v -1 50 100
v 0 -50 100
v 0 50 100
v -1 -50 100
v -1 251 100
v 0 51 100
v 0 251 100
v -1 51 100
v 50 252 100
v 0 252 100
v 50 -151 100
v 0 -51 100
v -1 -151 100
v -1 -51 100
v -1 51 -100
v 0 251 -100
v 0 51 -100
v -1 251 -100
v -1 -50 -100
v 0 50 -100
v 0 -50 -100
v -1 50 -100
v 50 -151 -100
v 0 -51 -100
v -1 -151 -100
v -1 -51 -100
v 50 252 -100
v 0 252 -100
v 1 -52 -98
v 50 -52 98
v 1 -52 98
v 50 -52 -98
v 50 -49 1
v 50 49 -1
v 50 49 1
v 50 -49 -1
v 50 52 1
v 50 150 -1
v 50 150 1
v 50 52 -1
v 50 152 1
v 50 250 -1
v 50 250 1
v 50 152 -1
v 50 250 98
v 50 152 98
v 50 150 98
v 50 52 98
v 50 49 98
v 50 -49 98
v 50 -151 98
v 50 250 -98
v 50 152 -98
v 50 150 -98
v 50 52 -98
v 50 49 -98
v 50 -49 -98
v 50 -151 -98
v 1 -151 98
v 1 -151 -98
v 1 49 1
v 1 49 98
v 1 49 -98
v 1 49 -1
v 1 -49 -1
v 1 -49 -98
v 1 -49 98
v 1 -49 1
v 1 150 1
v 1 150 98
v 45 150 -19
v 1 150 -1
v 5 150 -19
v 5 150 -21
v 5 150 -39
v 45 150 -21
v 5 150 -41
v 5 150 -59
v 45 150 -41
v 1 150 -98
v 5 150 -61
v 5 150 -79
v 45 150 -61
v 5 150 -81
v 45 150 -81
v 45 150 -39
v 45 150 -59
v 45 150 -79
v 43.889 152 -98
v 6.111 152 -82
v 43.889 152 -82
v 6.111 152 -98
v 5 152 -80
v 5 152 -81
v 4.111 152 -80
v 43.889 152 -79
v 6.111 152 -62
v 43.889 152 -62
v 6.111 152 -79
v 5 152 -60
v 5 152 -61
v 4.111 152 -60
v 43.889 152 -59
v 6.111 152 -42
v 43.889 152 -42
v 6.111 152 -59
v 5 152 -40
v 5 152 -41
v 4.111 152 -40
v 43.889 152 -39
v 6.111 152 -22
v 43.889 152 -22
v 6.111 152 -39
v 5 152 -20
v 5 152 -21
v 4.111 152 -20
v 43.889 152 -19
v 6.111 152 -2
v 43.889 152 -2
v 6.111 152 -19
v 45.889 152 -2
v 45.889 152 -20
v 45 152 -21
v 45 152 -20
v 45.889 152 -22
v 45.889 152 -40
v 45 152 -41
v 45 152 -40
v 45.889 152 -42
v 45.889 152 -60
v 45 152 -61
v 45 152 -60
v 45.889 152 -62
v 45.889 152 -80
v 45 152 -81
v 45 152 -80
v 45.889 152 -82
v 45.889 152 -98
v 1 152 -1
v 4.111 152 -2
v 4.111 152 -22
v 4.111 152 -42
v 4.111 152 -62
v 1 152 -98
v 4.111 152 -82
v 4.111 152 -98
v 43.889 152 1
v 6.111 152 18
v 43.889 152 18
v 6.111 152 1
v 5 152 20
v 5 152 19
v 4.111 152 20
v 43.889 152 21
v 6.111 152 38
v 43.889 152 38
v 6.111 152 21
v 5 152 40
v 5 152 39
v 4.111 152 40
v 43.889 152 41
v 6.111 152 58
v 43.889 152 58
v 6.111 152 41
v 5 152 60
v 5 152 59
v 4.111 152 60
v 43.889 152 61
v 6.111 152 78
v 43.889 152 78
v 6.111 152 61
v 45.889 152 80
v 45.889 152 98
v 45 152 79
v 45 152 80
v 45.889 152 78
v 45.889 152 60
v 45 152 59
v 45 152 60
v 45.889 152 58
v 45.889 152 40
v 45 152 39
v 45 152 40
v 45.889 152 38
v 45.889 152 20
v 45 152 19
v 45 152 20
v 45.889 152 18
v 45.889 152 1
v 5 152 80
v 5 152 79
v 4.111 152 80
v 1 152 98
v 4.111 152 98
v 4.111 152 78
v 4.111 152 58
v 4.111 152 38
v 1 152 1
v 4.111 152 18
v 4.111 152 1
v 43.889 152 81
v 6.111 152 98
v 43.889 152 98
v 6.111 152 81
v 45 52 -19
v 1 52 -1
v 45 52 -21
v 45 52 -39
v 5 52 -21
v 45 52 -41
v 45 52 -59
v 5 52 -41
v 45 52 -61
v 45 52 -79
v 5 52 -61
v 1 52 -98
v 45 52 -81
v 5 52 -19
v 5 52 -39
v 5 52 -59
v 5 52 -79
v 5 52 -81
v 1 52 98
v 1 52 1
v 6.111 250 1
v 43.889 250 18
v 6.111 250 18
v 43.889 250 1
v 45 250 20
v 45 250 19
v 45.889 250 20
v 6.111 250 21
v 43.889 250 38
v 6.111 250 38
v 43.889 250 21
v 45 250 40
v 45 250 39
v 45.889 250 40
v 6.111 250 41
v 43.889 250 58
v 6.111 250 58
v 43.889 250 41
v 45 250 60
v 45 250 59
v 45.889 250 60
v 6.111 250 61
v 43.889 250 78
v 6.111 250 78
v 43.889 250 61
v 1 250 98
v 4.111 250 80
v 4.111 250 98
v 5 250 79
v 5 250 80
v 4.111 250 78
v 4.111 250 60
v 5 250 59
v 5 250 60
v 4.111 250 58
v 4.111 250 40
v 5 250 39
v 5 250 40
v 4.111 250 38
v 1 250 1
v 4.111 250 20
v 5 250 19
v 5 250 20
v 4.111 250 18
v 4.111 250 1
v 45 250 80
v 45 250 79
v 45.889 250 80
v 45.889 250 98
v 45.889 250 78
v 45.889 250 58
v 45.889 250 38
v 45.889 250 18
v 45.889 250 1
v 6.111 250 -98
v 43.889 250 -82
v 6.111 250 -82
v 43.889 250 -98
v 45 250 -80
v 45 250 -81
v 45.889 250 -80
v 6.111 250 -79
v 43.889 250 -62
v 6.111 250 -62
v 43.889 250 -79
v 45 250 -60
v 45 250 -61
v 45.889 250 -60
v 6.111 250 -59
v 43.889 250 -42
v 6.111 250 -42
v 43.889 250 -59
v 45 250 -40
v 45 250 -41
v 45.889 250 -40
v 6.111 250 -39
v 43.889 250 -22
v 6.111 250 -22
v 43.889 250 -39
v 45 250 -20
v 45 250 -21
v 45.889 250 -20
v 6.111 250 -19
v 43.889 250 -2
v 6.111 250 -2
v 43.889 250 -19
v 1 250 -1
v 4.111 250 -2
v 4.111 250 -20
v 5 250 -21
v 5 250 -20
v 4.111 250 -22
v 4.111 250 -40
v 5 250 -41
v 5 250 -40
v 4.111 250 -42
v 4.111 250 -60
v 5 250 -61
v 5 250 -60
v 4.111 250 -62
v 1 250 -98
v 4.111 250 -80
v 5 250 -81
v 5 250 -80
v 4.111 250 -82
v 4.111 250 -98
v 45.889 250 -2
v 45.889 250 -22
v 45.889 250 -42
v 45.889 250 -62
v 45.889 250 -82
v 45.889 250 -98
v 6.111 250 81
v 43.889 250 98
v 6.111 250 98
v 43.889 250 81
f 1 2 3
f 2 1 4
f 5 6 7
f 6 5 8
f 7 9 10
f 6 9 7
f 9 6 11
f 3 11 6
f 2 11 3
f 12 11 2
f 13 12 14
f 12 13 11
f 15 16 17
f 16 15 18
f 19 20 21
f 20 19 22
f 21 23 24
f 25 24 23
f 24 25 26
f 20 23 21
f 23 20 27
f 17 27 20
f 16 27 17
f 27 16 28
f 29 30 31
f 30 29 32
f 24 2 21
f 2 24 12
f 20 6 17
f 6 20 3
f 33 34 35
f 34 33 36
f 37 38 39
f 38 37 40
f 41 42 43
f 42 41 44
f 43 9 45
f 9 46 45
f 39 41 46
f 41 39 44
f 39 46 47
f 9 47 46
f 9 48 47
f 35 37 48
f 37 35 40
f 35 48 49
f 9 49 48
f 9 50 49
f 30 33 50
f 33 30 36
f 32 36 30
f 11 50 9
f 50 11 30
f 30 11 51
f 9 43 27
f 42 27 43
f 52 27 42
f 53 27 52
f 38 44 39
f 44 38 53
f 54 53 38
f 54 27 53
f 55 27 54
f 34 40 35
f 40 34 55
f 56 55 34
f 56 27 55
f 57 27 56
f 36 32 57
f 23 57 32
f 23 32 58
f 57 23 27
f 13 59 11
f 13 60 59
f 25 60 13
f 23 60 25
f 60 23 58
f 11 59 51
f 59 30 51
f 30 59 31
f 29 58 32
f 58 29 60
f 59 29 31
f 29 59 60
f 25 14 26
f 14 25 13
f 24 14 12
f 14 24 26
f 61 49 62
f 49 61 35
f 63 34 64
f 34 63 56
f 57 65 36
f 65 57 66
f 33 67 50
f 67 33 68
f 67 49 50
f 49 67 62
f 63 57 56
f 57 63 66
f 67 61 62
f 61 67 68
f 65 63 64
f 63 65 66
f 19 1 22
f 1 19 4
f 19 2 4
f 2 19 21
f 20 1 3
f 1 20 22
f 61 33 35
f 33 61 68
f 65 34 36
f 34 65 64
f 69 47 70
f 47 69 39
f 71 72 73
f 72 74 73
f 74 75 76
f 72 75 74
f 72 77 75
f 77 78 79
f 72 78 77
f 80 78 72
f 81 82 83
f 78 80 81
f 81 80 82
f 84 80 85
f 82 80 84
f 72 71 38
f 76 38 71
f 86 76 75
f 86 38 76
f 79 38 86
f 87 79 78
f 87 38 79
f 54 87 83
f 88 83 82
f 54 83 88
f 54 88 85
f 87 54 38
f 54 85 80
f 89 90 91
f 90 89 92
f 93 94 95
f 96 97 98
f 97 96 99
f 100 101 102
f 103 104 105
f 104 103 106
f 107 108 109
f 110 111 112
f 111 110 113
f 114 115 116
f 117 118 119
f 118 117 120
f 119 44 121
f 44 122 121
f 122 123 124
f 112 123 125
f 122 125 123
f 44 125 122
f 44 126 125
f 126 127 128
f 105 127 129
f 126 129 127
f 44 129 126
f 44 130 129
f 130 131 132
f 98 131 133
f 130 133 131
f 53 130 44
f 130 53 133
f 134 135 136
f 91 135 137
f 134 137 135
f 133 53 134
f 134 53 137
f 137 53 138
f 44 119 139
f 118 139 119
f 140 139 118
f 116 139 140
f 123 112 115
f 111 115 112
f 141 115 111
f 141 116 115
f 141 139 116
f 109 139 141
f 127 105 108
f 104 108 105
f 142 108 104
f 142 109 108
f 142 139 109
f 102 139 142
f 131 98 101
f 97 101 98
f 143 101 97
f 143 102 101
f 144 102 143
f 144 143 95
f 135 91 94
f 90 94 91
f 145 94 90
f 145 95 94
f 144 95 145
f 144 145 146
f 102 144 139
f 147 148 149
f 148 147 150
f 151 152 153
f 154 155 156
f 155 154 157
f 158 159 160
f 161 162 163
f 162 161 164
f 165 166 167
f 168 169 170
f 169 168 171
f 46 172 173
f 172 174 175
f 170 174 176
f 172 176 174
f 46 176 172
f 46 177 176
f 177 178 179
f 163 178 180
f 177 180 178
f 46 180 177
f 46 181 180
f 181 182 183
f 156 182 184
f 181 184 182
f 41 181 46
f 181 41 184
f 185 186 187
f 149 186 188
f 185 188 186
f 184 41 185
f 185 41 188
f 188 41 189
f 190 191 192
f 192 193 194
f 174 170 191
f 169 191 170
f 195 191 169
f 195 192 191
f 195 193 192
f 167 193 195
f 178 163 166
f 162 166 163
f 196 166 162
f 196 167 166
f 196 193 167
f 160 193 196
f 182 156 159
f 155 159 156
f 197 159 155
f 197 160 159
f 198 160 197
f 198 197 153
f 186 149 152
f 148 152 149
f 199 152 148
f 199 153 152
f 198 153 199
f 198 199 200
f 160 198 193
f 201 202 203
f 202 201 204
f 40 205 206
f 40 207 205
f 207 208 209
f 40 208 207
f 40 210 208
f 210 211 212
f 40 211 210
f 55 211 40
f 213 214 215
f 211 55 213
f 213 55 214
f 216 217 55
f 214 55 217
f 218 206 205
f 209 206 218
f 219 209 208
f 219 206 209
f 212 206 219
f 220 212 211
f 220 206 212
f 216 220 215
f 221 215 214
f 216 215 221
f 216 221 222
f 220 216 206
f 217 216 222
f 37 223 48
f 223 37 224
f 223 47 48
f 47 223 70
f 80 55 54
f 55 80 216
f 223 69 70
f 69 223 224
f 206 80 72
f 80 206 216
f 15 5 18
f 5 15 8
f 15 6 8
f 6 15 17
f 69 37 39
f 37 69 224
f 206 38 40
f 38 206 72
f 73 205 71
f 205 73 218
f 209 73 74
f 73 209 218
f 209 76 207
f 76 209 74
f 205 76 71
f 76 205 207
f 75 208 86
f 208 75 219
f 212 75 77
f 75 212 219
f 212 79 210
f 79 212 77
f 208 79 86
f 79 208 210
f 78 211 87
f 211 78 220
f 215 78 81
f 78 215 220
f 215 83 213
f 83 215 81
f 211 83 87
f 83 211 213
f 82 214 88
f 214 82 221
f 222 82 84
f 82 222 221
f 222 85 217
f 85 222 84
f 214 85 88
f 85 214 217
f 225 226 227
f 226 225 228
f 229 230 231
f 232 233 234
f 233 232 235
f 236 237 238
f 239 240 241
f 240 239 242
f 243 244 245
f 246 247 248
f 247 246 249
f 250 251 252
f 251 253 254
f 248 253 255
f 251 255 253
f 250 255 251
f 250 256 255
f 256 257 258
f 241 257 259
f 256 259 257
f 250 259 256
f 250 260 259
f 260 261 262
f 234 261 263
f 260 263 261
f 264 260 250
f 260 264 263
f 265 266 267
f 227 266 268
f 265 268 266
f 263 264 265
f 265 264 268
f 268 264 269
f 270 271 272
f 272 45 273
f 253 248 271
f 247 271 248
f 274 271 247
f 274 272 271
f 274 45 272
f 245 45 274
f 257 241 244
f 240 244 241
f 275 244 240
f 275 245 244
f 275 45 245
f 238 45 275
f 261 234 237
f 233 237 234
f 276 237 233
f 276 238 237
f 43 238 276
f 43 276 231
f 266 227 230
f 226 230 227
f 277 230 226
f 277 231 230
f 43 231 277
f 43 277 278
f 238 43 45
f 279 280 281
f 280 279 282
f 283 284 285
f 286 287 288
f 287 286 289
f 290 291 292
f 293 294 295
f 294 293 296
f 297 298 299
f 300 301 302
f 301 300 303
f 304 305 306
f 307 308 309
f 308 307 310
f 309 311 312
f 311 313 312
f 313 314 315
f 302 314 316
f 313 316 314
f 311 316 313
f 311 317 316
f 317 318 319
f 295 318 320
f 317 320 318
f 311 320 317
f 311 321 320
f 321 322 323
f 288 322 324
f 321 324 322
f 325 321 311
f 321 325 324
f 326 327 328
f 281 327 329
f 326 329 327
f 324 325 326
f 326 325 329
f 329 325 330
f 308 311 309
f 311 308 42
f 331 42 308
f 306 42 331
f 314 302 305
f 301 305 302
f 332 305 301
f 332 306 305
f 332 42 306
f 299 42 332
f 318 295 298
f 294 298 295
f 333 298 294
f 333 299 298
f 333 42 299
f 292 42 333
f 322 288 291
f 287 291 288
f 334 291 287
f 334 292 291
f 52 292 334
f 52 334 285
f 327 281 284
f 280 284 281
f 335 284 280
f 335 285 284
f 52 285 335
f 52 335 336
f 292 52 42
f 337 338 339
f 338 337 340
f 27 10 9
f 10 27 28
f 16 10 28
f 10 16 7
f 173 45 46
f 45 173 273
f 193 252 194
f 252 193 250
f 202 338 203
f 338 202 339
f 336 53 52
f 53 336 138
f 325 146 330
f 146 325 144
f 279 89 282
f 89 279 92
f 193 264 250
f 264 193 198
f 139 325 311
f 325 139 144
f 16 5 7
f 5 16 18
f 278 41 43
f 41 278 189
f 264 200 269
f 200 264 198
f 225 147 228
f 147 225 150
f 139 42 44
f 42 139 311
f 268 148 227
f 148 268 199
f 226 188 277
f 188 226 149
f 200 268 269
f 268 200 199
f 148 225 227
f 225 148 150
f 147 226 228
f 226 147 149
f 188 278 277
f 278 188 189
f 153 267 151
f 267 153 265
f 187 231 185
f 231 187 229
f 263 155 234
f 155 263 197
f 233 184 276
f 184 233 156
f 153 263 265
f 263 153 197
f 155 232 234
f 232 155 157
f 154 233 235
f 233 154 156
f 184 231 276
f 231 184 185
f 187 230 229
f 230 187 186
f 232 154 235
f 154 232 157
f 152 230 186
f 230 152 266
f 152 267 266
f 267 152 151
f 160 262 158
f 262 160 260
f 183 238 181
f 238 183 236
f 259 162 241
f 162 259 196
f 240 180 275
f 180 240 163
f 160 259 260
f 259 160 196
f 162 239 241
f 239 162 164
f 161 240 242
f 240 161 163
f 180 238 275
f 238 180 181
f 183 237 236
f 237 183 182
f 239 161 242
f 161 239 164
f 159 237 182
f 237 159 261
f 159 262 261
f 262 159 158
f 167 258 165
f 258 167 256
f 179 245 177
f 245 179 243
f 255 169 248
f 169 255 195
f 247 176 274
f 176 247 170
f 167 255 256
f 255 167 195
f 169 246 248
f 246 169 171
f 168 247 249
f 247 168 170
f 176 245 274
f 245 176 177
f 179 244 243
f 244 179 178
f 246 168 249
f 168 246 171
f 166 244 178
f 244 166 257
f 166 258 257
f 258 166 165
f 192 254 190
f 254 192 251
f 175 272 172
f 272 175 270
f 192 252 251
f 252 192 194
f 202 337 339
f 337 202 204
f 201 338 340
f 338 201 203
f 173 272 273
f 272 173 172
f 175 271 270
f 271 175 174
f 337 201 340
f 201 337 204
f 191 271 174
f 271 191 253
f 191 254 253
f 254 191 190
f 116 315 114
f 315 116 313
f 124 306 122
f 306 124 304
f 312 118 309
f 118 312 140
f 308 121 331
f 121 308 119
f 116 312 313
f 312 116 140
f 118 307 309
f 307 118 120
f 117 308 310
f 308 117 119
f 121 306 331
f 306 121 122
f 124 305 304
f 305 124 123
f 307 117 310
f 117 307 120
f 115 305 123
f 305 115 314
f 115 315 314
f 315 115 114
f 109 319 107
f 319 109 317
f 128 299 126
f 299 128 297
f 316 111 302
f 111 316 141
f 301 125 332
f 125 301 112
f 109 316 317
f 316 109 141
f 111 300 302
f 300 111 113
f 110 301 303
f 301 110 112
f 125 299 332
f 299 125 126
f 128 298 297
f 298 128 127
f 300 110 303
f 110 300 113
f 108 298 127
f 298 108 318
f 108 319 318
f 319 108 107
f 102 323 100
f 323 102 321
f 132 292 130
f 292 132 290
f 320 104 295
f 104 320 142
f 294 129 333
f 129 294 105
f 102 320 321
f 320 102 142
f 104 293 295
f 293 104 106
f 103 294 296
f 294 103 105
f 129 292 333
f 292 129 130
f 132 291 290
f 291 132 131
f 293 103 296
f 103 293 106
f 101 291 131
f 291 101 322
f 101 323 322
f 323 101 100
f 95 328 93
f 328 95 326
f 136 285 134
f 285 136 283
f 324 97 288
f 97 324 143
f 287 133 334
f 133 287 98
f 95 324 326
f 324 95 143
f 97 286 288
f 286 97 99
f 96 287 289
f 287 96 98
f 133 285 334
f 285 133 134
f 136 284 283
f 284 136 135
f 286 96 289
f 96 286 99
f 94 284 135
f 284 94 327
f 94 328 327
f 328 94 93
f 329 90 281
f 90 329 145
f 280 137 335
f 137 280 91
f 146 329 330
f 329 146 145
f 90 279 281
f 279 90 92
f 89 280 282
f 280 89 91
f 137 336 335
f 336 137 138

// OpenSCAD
//placa generica
module placa(comp=200, larg=50, espessura=2) {
    cube([comp, larg, espessura], center = true); 
}

//placa fundo
module placaFundo(co, la)
{
  rotate([0,90,0]) placa(comp=co, larg=la);  
}
//placa lateral
module placaLateral(co, la)
{
  rotate([90,90,0]) placa(comp=co, larg=la);  
}
//placa base ou placa topo
module placaTopo(co, la){
  rotate([0,0,90]) placa(comp=co, larg=la);
}

// cria o portal de uma caixa para gaveta simples, modulo ou guarda roupa
// portal eh composto por:
//   - 2 laterais(esq e direita), 
//   - 2 topos (inferior e superior)
module portal(cl, cb, la, comLE=true, comDE=true) {
    dist = 0;    
    //direita
    if (comDE) {    
        translate([dist, cb/2, 0 ]) placaLateral(co=cl,la=la);
    }
    //esquerda
    if (comLE) {    
        translate([dist, -cb/2, 0 ]) placaLateral(co=cl,la=la);
    }    
    //superior
    translate([dist, 0,cl/la*(la-1)/2 + 1]) placaTopo(co=cb, la=la);
    //inferior    
    translate([dist, 0,cl/la*(1-la)/2 - 1]) placaTopo(co=cb, la=la); 
}

// caixa 
// fba e fla = base e largura do fundo, 
// cl = comprimento lateral
// cb = comprimento base
// la = largura do portal (profundidade)
// comLE = com lateral esquerda (valor default = true)
module caixa(fba=200, fla=100, cl=200, cb=200, la=100, comLE=true, comDE=true, comFundo=true) {
//fundo
    if (comFundo) { 
        color("brown") placaFundo(co=fba, la=fla);
    }    
//portal
    dist = la / 2;
    translate([dist,0,0]) portal(cb=cb, cl=cl, la=la, comLE=comLE, comDE=comDE)  ;  
}    

//caixa dividida no meio
//TODO parametrizar melhor esse metodo
module unidadeBasica() {
    caixa(fba=200, fla=100, cl=200, cb=100, la=50);
    translate([25, 0, 0 ]) placaTopo(co=100, la=50);
}


// TODO refazer gaveta simples = ela não é caixa,
// 2 laterais, costas e frente, a parte de baixo - fundo - 
// esta ha alguns mm longe do final da caixa
// modelar o freso da caixa : laterais e costas
//gaveta simples tamanho padrão
//TODO parametrizar melhor esse metodo
module gavetaS(comFundo=true){
  rotate([0,270,0])
  caixa(fba=40, fla=100, cl=40, cb=100, la=18,comLE=true,comDE=true,comFundo=comFundo);  
}

//TODO parametrizar melhor esse metodo
module unidadePlacas(gcomp, gprof, sup=true, inf=true){
    unidadeBasica();
    if (sup) {
        translate([25,0, 20]) placaTopo(gcomp, gprof);
        translate([25,0, 40]) placaTopo(gcomp, gprof);
        translate([25,0, 60]) placaTopo(gcomp, gprof);
        translate([25,0, 80]) placaTopo(gcomp, gprof);
        //translate([25,0, 100]) placaTopo(gcomp, gprof);
    }    
    if (inf) {
        translate([25,0,-20]) placaTopo(gcomp, gprof);
        translate([25,0,-40]) placaTopo(gcomp, gprof);
        translate([25,0,-60]) placaTopo(gcomp, gprof);
        translate([25,0,-80]) placaTopo(gcomp, gprof);
       // translate([25,0,-100]) placaTopo(gcomp, gprof);
    }    
} 

//TODO parametrizar melhor esse metodo
//guarda roupa 5 gavetas
module unidadeGavetas(comFundoUltimaGaveta=false, inf=true, sup=true) {
    unidadeBasica();
    
    if (sup) {
        translate([25,0, 0]) gavetaS();
        translate([25,0, 20]) gavetaS();
        translate([25,0, 40]) gavetaS();
        translate([25,0, 60]) gavetaS();
        translate([25,0, 80]) gavetaS();
    }    
    if (inf) {
        translate([25,0,-20]) gavetaS();
        translate([25,0,-40]) gavetaS();
        translate([25,0,-60]) gavetaS();
        translate([25,0,-80]) gavetaS();
        translate([25,0,-100]) gavetaS(comFundo=comFundoUltimaGaveta);
    }    
}

module parede1() {
    translate([0,-101,0]) 
    caixa(fba=200, fla=100, cl=200, cb=100, la=50, comLE=false);
    unidadeBasica();
    translate([0,101,0]) unidadePlacas(gcomp=100,gprof=40,inf=true, sup=false);
    translate([0,201,0]) unidadeGavetas();    
}

parede1();
